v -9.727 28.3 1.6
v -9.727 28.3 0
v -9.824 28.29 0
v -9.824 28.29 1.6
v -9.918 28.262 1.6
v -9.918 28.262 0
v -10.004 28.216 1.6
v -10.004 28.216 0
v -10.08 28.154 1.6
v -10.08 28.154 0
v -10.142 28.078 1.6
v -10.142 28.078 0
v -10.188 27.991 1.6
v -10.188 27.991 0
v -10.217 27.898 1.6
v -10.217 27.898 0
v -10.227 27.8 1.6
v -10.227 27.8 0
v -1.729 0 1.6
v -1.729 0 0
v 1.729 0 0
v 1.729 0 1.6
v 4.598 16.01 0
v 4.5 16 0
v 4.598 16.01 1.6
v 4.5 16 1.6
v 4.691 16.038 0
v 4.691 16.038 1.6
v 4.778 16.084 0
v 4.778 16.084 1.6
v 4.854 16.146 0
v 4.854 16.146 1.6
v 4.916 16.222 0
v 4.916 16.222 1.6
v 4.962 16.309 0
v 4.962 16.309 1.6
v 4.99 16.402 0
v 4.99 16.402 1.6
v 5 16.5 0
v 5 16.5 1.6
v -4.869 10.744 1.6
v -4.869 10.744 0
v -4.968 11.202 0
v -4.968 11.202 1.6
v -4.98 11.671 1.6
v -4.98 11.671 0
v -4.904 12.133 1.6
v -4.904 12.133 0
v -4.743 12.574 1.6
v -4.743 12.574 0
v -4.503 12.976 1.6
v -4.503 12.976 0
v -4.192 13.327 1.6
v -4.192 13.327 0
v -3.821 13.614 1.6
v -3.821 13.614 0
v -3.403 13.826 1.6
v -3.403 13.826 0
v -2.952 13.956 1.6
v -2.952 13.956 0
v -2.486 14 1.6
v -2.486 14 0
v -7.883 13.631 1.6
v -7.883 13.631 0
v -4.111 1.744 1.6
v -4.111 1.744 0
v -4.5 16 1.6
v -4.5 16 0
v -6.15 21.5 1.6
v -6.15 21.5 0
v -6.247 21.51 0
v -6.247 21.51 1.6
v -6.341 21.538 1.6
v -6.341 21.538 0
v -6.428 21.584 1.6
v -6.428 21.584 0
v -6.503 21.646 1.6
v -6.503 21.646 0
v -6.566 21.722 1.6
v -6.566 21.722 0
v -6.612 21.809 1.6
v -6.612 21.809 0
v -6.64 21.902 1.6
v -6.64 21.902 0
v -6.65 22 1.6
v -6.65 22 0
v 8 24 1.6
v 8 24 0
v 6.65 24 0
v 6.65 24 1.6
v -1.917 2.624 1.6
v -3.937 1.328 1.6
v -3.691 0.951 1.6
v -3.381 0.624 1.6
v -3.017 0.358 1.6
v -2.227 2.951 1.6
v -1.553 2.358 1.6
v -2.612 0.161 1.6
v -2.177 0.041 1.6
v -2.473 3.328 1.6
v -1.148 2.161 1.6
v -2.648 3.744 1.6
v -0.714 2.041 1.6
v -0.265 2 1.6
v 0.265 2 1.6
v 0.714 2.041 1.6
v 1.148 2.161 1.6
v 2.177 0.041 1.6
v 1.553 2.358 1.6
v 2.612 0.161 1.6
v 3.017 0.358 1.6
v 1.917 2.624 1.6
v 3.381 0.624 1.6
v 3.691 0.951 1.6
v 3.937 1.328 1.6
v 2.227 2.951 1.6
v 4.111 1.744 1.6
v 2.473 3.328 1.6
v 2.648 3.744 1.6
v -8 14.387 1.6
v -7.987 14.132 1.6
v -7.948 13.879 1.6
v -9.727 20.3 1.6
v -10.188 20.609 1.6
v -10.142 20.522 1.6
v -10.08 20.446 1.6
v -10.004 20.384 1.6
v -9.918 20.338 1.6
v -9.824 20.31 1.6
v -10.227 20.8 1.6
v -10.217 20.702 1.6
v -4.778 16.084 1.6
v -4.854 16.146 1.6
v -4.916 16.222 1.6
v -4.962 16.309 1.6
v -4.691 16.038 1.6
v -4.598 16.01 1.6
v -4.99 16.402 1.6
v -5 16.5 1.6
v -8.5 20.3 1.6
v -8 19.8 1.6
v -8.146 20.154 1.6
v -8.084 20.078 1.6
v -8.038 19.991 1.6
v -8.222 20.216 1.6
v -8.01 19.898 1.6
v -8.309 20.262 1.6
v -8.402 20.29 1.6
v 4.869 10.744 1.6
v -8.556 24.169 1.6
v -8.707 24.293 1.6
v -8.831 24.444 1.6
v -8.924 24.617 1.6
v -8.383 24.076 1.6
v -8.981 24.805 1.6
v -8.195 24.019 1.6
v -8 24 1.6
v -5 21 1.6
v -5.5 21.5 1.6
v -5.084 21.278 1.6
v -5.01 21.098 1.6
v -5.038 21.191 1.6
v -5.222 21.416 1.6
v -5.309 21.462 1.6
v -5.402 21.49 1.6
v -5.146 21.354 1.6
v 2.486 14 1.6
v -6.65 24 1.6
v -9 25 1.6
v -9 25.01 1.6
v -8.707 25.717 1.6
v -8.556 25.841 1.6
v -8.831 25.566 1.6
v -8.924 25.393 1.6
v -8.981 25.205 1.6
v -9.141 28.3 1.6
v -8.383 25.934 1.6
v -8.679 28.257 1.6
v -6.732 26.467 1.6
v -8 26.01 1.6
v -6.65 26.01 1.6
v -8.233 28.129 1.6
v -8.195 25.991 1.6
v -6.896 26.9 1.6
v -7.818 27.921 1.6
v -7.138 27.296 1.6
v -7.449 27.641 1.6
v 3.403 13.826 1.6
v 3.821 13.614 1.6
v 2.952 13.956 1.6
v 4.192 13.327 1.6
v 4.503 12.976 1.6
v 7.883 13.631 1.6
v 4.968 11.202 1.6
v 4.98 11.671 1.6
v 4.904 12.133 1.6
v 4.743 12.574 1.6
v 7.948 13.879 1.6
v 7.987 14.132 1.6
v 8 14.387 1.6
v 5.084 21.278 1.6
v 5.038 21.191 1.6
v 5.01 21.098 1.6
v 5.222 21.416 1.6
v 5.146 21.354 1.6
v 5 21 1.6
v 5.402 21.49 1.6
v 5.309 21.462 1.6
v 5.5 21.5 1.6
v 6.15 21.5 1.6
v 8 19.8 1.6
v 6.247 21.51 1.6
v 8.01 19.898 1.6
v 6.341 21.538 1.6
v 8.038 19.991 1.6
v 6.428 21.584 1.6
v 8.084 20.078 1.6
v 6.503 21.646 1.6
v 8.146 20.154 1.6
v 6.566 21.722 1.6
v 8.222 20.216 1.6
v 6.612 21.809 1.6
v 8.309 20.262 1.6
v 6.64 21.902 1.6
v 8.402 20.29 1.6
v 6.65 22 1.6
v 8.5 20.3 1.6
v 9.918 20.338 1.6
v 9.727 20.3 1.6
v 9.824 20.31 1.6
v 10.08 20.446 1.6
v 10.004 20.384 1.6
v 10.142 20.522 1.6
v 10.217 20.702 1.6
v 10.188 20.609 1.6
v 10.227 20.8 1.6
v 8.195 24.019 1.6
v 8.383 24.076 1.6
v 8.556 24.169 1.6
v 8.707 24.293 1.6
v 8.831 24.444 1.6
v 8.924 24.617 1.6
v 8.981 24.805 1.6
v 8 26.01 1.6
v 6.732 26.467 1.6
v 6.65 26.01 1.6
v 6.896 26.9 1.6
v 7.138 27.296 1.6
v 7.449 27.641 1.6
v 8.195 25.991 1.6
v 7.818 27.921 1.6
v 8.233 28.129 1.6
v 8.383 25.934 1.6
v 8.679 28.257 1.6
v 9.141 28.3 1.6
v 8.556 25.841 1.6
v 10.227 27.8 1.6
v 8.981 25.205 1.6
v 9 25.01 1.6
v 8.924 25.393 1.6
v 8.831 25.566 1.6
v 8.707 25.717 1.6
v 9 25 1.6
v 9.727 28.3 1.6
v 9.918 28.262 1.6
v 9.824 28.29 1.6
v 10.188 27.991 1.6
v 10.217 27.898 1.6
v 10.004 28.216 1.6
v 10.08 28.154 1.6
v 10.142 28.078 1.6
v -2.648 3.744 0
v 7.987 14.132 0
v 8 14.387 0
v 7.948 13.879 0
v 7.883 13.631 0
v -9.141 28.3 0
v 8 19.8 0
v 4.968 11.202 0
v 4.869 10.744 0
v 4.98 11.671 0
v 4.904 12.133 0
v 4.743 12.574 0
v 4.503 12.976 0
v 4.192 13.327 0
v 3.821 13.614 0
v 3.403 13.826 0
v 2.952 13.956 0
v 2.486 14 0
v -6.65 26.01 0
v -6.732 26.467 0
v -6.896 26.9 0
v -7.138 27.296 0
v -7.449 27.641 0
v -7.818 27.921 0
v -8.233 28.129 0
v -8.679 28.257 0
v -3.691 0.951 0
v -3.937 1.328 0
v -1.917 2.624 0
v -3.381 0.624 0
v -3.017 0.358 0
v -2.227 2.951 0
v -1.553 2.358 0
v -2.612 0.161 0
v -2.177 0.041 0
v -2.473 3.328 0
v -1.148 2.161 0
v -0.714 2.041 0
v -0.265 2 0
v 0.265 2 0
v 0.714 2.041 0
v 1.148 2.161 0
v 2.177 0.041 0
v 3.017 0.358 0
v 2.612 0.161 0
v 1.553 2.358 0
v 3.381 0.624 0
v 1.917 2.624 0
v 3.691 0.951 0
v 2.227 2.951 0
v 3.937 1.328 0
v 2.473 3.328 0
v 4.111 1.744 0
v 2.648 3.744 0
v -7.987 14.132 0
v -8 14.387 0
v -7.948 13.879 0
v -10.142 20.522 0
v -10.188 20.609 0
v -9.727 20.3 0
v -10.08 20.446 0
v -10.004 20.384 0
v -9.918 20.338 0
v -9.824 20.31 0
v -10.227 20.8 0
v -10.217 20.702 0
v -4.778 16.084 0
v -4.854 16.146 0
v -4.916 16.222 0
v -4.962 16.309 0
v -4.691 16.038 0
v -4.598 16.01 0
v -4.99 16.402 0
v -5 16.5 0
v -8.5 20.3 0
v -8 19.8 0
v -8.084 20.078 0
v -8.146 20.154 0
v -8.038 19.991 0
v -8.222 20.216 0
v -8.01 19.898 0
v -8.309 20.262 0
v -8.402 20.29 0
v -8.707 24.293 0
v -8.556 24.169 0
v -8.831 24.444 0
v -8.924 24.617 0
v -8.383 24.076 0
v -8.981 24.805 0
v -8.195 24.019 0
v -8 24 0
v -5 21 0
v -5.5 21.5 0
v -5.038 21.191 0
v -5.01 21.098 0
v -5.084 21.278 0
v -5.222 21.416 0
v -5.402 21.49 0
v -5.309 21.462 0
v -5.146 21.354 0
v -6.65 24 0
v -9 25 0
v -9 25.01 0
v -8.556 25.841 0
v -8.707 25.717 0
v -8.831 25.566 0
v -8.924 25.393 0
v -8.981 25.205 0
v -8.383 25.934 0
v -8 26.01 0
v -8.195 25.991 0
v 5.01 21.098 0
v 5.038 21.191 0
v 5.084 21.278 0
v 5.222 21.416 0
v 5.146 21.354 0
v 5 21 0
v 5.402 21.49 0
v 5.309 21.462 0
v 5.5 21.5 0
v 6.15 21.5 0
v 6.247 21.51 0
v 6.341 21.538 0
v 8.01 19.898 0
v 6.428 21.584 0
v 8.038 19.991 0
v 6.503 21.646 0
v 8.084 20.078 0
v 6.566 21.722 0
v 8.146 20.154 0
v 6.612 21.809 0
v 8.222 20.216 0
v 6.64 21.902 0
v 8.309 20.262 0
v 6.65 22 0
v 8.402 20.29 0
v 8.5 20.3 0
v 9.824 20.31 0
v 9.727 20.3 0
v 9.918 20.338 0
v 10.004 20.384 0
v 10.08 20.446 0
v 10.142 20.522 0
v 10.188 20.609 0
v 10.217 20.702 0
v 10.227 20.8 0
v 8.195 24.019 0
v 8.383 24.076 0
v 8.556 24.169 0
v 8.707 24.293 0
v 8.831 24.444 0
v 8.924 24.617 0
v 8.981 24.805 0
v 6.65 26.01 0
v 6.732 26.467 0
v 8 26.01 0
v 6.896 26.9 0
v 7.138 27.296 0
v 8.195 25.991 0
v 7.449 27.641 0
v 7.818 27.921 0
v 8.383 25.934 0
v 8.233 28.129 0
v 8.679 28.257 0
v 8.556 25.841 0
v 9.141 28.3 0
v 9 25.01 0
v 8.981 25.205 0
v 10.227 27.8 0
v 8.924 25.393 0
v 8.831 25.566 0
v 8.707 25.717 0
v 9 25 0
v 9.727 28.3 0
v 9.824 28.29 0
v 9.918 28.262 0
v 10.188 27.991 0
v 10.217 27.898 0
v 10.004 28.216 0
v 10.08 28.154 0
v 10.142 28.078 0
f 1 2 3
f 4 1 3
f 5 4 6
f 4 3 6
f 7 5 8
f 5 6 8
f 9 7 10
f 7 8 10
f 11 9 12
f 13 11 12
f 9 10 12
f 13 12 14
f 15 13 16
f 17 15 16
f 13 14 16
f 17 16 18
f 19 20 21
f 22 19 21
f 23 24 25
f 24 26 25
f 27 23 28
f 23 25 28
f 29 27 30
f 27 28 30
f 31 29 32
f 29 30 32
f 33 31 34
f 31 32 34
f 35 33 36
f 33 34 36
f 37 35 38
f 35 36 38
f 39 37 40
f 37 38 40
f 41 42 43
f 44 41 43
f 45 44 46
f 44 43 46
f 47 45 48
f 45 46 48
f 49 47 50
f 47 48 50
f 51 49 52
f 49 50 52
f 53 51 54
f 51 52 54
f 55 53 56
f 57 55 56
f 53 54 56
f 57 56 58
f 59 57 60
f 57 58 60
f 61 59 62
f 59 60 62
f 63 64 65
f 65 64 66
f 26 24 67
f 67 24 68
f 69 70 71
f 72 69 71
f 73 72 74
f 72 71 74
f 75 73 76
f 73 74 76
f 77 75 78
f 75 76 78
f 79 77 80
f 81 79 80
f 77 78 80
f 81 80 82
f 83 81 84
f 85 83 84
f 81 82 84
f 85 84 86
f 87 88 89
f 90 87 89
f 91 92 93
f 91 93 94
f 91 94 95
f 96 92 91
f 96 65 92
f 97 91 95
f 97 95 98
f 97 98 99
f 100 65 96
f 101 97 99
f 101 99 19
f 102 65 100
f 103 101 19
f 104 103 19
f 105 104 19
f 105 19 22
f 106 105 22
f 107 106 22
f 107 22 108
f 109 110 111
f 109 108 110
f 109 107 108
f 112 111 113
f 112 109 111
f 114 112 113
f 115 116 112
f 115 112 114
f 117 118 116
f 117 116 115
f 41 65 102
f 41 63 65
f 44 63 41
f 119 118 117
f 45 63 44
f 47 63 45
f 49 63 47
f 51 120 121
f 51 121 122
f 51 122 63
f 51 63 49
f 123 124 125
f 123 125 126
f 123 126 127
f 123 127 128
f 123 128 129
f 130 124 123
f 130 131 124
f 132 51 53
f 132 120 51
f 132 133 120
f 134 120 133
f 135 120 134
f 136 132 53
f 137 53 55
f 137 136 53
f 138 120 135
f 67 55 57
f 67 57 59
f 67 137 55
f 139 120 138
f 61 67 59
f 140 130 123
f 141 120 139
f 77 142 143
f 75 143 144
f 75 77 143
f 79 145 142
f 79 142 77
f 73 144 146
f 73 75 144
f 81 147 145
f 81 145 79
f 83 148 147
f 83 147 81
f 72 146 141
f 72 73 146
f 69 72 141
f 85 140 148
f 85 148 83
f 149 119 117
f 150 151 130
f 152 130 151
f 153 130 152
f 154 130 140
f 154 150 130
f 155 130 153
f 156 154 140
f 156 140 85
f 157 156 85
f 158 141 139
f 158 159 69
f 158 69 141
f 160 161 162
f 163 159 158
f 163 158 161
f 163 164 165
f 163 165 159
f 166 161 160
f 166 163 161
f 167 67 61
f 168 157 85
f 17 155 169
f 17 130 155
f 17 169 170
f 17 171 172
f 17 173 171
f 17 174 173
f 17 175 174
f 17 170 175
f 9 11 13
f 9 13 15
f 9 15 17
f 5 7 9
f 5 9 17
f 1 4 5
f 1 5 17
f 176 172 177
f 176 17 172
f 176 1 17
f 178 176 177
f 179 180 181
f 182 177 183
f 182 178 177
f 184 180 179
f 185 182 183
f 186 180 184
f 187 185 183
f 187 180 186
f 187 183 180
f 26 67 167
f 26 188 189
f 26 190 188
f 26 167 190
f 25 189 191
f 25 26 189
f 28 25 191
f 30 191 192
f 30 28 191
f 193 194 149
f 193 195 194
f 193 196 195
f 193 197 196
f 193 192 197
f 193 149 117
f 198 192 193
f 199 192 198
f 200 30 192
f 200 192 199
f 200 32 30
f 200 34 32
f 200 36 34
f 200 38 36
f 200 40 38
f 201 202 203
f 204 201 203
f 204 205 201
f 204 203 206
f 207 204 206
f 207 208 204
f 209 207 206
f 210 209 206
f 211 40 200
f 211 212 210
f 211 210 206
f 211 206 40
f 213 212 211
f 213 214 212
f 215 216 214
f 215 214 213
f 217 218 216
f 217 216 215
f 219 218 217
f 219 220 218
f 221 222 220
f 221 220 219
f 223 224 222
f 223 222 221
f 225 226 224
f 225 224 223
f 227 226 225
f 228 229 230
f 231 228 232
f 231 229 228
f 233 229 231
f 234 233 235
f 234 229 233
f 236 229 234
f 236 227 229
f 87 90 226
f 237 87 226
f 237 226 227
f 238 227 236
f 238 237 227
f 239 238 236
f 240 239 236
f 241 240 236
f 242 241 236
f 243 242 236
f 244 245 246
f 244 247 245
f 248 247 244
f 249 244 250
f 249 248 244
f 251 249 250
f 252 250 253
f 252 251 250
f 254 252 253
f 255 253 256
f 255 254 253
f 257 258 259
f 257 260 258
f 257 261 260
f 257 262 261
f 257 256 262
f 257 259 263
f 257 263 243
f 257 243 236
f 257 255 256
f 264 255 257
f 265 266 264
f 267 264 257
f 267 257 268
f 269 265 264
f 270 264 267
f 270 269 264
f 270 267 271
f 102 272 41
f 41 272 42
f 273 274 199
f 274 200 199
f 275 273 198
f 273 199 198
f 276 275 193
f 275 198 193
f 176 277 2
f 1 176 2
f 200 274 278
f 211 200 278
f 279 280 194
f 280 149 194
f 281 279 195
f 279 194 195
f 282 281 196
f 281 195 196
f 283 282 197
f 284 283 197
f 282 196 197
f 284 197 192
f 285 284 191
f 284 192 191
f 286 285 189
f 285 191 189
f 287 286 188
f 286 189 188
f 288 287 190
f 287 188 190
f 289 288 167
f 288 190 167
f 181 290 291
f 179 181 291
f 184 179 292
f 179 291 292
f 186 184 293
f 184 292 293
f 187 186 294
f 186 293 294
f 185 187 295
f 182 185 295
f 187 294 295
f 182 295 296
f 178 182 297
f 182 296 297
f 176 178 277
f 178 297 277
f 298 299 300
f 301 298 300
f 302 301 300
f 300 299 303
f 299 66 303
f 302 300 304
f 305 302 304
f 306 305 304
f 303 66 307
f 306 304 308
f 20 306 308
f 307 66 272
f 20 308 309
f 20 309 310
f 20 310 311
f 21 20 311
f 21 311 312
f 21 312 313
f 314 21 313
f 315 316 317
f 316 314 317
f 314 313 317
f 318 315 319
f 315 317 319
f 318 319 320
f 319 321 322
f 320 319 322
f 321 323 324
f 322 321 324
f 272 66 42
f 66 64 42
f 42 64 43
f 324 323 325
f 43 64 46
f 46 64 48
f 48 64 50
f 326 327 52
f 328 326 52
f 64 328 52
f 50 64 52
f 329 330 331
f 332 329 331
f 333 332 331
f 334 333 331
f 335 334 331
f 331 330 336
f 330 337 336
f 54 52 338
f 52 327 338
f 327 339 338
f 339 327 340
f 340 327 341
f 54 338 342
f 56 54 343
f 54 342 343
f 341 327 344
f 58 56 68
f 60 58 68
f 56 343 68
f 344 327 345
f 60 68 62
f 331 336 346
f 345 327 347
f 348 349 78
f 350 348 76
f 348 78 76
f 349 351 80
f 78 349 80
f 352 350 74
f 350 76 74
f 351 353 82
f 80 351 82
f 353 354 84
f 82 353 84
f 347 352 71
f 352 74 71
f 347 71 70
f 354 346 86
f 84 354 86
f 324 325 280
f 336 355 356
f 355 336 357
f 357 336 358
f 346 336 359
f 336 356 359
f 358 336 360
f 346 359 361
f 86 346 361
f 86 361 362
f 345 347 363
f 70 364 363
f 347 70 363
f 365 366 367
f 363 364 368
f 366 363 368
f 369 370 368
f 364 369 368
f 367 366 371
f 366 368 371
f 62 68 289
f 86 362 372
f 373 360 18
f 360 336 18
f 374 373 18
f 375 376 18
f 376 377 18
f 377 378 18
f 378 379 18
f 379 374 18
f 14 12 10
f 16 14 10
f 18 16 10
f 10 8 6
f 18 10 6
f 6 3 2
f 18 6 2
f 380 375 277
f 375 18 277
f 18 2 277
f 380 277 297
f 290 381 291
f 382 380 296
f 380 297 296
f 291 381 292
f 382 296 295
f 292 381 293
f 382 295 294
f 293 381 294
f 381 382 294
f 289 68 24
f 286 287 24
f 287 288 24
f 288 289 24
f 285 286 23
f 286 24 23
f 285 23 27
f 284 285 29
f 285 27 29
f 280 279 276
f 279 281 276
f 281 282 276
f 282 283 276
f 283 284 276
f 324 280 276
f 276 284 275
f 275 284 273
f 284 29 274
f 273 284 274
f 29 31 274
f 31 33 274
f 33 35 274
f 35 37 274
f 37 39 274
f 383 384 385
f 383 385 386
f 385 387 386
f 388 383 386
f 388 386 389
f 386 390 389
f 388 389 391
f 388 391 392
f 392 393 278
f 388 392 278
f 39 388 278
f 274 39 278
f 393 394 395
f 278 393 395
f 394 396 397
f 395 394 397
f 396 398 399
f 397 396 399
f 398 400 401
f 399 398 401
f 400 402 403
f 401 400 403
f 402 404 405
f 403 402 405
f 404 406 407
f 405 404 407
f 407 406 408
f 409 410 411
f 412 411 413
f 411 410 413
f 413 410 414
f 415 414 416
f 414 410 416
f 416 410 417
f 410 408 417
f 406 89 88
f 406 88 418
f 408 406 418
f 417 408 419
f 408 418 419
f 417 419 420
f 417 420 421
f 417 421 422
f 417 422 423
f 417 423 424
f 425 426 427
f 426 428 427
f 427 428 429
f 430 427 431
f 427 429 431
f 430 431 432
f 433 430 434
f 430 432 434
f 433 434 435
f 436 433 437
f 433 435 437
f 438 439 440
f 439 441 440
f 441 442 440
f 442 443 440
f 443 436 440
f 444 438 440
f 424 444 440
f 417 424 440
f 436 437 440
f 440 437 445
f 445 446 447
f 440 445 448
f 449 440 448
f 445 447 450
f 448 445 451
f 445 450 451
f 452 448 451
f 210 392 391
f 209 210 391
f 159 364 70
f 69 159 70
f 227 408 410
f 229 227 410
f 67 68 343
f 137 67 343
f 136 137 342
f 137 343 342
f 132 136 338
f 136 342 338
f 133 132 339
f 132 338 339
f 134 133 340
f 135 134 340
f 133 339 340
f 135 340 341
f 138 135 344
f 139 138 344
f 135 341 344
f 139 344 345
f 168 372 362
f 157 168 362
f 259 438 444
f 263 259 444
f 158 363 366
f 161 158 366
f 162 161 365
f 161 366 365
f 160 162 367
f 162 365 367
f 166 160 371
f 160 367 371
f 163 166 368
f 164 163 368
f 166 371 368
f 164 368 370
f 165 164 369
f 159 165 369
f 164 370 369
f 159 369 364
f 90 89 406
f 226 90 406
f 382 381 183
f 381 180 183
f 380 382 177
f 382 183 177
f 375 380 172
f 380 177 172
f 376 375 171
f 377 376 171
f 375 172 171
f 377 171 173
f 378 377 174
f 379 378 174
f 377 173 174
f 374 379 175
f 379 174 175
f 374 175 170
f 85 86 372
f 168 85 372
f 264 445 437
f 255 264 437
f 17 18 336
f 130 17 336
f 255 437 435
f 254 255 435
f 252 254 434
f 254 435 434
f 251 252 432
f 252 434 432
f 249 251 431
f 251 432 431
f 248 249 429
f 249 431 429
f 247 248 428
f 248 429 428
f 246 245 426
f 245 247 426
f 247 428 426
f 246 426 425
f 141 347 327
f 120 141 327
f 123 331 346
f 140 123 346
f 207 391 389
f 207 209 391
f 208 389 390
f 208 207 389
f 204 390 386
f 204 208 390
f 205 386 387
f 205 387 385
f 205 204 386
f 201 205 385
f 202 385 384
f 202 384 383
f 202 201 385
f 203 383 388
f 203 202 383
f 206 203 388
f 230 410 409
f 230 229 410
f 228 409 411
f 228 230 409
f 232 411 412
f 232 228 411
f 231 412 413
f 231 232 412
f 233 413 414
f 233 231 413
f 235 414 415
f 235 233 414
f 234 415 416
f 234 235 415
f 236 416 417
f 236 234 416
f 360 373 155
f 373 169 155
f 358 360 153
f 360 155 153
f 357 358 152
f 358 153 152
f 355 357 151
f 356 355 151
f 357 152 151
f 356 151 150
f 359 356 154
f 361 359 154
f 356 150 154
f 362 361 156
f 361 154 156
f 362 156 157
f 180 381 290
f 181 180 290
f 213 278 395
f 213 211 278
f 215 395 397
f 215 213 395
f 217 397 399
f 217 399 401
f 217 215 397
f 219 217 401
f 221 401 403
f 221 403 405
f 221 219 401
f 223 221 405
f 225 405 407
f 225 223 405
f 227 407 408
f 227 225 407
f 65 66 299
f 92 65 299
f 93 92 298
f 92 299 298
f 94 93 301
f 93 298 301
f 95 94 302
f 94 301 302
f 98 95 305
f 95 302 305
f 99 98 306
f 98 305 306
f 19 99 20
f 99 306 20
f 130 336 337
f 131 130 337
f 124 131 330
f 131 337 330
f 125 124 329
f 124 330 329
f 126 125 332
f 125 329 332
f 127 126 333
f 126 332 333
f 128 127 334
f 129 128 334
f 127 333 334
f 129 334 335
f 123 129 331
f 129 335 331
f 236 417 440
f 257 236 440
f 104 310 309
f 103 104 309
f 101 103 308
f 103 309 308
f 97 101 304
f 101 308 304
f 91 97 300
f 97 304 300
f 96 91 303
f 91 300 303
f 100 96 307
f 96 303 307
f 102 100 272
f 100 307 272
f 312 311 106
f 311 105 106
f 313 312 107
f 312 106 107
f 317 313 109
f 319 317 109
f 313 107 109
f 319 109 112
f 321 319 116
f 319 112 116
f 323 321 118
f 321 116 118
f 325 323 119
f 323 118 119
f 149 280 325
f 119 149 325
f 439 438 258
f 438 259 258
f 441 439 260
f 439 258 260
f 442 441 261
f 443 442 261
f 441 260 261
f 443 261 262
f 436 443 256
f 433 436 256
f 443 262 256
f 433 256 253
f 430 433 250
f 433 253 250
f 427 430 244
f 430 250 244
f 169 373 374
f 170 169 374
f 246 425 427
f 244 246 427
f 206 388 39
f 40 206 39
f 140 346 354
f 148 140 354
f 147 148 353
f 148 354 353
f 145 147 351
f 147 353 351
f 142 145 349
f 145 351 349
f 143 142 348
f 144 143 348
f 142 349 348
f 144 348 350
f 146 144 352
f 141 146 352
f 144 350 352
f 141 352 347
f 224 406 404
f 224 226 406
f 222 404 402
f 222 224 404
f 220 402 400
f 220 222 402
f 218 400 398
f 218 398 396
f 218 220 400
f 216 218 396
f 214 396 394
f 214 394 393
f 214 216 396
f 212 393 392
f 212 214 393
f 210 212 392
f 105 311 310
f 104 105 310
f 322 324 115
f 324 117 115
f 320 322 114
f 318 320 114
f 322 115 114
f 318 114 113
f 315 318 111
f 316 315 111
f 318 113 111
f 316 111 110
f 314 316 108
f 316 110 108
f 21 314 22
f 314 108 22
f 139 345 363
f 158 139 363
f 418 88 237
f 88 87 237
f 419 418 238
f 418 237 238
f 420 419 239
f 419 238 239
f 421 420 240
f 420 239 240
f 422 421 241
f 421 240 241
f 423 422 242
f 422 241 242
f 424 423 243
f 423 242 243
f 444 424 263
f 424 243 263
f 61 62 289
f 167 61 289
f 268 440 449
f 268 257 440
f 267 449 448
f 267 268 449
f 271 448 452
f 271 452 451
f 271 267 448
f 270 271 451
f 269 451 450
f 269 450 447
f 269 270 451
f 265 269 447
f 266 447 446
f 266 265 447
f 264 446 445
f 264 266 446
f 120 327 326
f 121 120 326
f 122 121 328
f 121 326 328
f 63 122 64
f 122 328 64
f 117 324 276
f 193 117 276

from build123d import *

# Parameters (mm, degrees)
BOSS_EXTRUDE1_DEPTH = 1.6
FILLET7_R           = 0.5
FILLET8_R           = 2.5
FILLET9_R           = 2.5
MIRROR1_DEPTH       = 1.6
FILLET10_R          = 1


# Read off the part's stored shape, not the designer's step: Mirror1
with BuildPart() as part:
    # Sketch1 → Boss-Extrude1 (new body)
    with BuildSketch(Plane.XY):
        Polygon((5, 16), (0, 16), (0, 14), (5.901749013, 14), (2.094432467, 2), (0, 2), (0, 0), (3.558130696, 0), (8, 14), (8, 20.3), (10.226542067, 20.3), (10.226542067, 28.3), (6.6499, 28.3), (6.6499, 26.01), (9, 26.01), (9, 24), (6.6499, 24), (6.6499, 21.5), (5, 21.5), align=None)
    extrude(amount=BOSS_EXTRUDE1_DEPTH)

    # Fillet7
    fillet7_edges = [part.edges().sort_by_distance(p)[0] for p in [
        (5, 16, 0.8),
        (5, 21.5, 0.8),
        (6.6499, 21.5, 0.8),
        (10.226542067, 28.3, 0.8),
        (10.226542067, 20.3, 0.8),
        (8, 20.3, 0.8),
    ]]
    fillet(fillet7_edges, radius=FILLET7_R)

    # Fillet8
    # the kernel refuses this fillet: 2.5 mm, written as the material it takes off along each edge
    with BuildSketch(Plane(origin=(6.6499, 28.3, -6.227910966), x_dir=(0, -1, 0), z_dir=(0, 0, 1))) as fillet8_piece_1:
        with BuildLine():
            CenterArc((2.5, 2.491164386), FILLET8_R, 180, 85.181476567)
            Line((0, 2.491164386), (-0.05, 2.491164386))
            Line((-0.05, 2.491164386), (-0.05, 0))
            Line((-0.05, 0), (0, -0.05))
            ThreePointArc((0, -0.05), (1.145, -0.05), (2.2858, -0.049823288))
            Line((2.2858, -0.049823288), (2.29, 0))
        make_face()
    extrude(amount=14.055821932, mode=Mode.SUBTRACT)

    # Fillet9
    fillet9_edges = [part.edges().sort_by_distance(p)[0] for p in [
        (8, 14, 0.8),
        (3.558130696, 0, 0.8),
        (2.094432467, 2, 0.8),
        (5.901749013, 14, 0.8),
    ]]
    fillet(fillet9_edges, radius=FILLET9_R)

    # Mirror1 outline → Mirror1 (add)
    with BuildSketch(Plane.XY):
        with BuildLine():
            Line((0, 16), (-4.5, 16))
            ThreePointArc((-4.5, 16), (-4.853553391, 16.146446609), (-5, 16.5))
            Line((-5, 16.5), (-5, 21))
            ThreePointArc((-5, 21), (-5.146446609, 21.353553391), (-5.5, 21.5))
            Line((-5.5, 21.5), (-6.1499, 21.5))
            ThreePointArc((-6.1499, 21.5), (-6.503453391, 21.646446609), (-6.6499, 22))
            Line((-6.6499, 22), (-6.6499, 24))
            Line((-6.6499, 24), (-9, 24))
            Line((-9, 24), (-9, 26.01))
            Line((-9, 26.01), (-6.6499, 26.01))
            ThreePointArc((-6.6499, 26.01), (-7.449171955, 27.640516232), (-9.141064386, 28.3))
            Line((-9.141064386, 28.3), (-9.726542067, 28.3))
            ThreePointArc((-9.726542067, 28.3), (-10.080095458, 28.153553391), (-10.226542067, 27.8))
            Line((-10.226542067, 27.8), (-10.226542067, 20.8))
            ThreePointArc((-10.226542067, 20.8), (-10.080095458, 20.44644661), (-9.726542067, 20.3))
            Line((-9.726542067, 20.3), (-8.5, 20.3))
            ThreePointArc((-8.5, 20.3), (-8.146446609, 20.153553391), (-8, 19.8))
            Line((-8, 19.8), (-8, 14.38708754))
            ThreePointArc((-8, 14.38708754), (-7.970560929, 14.004558199), (-7.882937042, 13.631037905))
            Line((-7.882937042, 13.631037905), (-4.111444952, 1.743950364))
            ThreePointArc((-4.111444952, 1.743950364), (-3.204969205, 0.482560523), (-1.72850791, 0))
            Line((-1.72850791, 0), (0, 0))
            Line((0, 0), (0, 2))
            Line((0, 2), (-0.264809681, 2))
            ThreePointArc((-0.264809681, 2), (-1.741270976, 2.482560523), (-2.647746723, 3.743950364))
            Line((-2.647746723, 3.743950364), (-4.868681376, 10.743950364))
            ThreePointArc((-4.868681376, 10.743950364), (-4.503183811, 12.976461295), (-2.485744333, 14))
            Line((-2.485744333, 14), (0, 14))
            Line((0, 14), (0, 16))
        make_face()
    extrude(amount=MIRROR1_DEPTH)

    # Fillet10
    fillet10_edges = [part.edges().sort_by_distance(p)[0] for p in [
        (-9, 24, 0.8),
        (-9, 26.01, 0.8),
        (9, 24, 0.8),
        (9, 26.01, 0.8),
    ]]
    fillet(fillet10_edges, radius=FILLET10_R)


solid = part.part
